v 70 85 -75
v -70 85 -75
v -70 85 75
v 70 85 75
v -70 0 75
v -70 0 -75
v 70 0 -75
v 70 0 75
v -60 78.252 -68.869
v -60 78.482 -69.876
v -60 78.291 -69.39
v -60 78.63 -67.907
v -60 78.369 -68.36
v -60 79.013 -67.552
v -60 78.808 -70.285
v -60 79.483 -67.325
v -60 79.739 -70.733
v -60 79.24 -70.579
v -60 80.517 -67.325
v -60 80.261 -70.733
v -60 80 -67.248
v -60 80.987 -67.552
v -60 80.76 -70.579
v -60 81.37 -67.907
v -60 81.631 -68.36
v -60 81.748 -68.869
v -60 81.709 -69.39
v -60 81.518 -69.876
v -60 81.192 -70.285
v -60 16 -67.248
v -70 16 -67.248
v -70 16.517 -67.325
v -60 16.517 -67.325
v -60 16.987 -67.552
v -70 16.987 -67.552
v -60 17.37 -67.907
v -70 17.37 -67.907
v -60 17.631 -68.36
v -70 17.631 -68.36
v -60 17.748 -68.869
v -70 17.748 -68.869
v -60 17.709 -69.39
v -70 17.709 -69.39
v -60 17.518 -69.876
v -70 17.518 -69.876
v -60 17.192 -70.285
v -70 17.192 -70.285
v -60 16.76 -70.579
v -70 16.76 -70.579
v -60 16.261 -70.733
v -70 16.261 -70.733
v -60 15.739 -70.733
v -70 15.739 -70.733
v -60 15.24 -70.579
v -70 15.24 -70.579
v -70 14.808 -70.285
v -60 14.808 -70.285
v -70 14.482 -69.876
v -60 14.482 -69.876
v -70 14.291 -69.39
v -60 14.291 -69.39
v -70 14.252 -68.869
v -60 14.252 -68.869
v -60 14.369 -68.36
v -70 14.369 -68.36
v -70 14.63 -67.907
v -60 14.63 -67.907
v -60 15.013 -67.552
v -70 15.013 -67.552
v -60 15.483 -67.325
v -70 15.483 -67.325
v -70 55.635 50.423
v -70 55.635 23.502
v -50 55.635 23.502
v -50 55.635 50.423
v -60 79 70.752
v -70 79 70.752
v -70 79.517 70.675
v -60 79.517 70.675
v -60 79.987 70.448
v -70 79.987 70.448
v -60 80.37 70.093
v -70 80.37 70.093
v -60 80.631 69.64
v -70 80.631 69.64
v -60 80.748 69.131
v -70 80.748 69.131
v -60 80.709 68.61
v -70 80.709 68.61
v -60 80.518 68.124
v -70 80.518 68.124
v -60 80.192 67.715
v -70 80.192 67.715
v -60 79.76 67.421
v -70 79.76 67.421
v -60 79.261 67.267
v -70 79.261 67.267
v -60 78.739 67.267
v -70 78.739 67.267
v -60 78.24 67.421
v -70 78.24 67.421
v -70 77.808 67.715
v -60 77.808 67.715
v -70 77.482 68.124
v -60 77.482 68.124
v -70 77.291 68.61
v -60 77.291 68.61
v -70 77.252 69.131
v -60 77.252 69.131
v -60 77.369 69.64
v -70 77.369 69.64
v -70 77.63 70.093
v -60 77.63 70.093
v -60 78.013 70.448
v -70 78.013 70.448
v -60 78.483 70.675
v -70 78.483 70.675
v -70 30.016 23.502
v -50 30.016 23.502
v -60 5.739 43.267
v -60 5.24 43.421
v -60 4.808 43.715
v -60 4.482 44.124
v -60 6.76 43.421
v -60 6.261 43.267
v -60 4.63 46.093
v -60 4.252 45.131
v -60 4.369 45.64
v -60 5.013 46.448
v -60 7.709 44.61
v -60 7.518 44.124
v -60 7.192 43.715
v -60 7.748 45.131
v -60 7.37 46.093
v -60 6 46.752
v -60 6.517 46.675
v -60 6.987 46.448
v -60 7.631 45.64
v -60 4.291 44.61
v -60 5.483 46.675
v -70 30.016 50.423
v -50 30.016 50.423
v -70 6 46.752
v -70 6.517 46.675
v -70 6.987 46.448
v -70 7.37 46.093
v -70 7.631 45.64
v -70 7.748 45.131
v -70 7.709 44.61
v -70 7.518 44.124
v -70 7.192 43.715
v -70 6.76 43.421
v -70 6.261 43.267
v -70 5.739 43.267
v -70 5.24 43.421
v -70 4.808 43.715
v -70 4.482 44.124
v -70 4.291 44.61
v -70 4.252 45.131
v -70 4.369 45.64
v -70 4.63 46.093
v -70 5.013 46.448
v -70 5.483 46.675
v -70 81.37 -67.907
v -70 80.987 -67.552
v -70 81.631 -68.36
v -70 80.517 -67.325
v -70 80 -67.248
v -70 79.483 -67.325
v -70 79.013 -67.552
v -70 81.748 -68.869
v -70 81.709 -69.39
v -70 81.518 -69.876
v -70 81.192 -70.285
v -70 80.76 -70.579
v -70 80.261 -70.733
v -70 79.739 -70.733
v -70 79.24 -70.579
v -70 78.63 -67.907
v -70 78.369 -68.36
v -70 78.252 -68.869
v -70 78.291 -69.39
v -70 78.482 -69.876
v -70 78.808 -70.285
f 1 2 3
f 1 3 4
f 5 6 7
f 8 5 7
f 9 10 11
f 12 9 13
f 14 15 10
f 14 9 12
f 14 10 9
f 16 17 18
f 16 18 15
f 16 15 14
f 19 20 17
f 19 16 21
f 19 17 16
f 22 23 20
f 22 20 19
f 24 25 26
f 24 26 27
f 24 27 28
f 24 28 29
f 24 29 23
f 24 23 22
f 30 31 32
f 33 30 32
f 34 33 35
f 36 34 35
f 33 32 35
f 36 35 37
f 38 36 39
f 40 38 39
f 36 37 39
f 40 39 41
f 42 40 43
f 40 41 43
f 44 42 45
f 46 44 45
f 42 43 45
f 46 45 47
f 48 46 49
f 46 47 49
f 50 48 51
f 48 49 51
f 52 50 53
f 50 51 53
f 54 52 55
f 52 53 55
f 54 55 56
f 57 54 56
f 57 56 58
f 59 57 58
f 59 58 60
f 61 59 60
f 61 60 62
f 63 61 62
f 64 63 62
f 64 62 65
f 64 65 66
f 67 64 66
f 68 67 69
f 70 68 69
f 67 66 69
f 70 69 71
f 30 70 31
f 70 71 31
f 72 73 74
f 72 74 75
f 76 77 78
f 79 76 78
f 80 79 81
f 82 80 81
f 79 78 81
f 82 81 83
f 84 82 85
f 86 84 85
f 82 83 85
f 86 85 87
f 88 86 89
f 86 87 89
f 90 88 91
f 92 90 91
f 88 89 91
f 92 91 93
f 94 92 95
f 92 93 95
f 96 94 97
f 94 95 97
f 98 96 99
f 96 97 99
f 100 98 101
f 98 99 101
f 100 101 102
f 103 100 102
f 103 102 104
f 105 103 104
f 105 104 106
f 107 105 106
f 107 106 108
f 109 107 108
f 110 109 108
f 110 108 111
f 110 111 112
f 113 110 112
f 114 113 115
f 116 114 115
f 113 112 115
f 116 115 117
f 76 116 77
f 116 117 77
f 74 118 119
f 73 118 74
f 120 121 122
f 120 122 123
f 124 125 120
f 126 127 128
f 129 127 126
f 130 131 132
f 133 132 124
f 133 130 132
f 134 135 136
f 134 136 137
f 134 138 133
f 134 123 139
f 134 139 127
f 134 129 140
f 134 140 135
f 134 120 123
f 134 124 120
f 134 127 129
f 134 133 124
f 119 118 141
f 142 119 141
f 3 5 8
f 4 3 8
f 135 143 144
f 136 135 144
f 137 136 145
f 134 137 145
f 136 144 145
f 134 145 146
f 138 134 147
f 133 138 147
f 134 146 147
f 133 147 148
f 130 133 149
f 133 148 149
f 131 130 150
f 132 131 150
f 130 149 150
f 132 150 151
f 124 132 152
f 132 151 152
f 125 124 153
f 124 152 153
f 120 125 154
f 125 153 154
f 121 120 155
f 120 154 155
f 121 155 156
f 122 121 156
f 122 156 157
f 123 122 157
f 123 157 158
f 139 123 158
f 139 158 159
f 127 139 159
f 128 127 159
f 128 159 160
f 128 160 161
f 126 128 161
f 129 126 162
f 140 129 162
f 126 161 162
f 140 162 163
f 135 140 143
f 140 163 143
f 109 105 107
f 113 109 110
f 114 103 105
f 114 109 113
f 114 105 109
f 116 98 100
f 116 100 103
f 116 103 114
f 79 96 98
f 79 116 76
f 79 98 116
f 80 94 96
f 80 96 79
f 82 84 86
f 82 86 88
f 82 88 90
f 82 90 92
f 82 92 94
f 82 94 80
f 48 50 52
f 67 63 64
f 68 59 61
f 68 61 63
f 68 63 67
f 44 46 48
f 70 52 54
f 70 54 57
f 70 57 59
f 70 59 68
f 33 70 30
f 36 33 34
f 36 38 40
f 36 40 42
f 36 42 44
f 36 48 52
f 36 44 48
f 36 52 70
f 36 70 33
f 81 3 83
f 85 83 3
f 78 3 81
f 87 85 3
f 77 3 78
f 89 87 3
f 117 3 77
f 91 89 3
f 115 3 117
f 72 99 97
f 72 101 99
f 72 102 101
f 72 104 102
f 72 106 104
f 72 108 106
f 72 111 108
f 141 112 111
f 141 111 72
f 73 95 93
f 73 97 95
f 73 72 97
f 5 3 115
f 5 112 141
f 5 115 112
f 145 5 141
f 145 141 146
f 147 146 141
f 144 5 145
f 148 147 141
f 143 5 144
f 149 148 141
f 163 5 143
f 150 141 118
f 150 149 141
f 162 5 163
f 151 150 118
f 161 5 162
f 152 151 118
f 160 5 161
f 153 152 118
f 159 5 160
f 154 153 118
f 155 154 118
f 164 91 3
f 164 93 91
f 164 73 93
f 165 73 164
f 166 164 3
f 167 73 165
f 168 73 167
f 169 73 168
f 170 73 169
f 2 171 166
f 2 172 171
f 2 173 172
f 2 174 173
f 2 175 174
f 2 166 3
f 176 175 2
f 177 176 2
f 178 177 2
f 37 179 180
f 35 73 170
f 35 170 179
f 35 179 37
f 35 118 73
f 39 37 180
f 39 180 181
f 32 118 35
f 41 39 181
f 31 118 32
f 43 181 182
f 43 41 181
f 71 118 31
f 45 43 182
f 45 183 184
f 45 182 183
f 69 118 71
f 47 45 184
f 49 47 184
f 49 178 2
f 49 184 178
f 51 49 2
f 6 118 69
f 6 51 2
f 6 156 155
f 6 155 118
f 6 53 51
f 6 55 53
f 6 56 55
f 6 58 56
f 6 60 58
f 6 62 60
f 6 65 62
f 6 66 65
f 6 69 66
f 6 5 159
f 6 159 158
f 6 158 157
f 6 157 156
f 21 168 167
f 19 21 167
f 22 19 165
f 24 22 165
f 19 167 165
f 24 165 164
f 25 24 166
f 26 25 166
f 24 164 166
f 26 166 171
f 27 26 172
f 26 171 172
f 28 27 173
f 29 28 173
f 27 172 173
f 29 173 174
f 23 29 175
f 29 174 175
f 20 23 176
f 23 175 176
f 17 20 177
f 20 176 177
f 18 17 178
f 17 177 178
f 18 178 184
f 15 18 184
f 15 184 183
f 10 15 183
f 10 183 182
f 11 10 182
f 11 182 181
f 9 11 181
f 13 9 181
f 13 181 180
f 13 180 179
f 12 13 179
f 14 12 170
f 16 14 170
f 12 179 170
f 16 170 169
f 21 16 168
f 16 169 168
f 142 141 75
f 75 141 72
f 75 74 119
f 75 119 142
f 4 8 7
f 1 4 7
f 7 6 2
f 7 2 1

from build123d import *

# Parameters (mm, degrees)
SKETCH1_W           = 140
SKETCH1_H           = 150
BOSS_EXTRUDE1_DEPTH = 85
SKETCH2_W           = 26.921212121
SKETCH2_H           = 25.618572825
CUT_EXTRUDE1_DEPTH  = 20
SKETCH3_R           = 1.7525
CUT_EXTRUDE2_DEPTH  = 10


with BuildPart() as part:
    # Sketch1 → Boss-Extrude1 (new body)
    with BuildSketch(Plane(origin=(0, 0, 0), x_dir=(1, 0, 0), z_dir=(0, 1, 0))):
        Rectangle(SKETCH1_W, SKETCH1_H)
    extrude(amount=BOSS_EXTRUDE1_DEPTH)

    # Sketch2 → Cut-Extrude1 (cut)
    with BuildSketch(Plane.ZY.offset(70)):
        with Locations((36.962390029, 42.825659825)):
            Rectangle(SKETCH2_W, SKETCH2_H)
    extrude(amount=-CUT_EXTRUDE1_DEPTH, mode=Mode.SUBTRACT)

    # Sketch3 → Cut-Extrude2 (cut)
    with BuildSketch(Plane.ZY.offset(70)):
        with Locations((45, 6)):
            Circle(SKETCH3_R)
        with Locations((69, 79)):
            Circle(SKETCH3_R)
        with Locations((-69, 80)):
            Circle(SKETCH3_R)
        with Locations((-69, 16)):
            Circle(SKETCH3_R)
    extrude(amount=-CUT_EXTRUDE2_DEPTH, mode=Mode.SUBTRACT)


solid = part.part
